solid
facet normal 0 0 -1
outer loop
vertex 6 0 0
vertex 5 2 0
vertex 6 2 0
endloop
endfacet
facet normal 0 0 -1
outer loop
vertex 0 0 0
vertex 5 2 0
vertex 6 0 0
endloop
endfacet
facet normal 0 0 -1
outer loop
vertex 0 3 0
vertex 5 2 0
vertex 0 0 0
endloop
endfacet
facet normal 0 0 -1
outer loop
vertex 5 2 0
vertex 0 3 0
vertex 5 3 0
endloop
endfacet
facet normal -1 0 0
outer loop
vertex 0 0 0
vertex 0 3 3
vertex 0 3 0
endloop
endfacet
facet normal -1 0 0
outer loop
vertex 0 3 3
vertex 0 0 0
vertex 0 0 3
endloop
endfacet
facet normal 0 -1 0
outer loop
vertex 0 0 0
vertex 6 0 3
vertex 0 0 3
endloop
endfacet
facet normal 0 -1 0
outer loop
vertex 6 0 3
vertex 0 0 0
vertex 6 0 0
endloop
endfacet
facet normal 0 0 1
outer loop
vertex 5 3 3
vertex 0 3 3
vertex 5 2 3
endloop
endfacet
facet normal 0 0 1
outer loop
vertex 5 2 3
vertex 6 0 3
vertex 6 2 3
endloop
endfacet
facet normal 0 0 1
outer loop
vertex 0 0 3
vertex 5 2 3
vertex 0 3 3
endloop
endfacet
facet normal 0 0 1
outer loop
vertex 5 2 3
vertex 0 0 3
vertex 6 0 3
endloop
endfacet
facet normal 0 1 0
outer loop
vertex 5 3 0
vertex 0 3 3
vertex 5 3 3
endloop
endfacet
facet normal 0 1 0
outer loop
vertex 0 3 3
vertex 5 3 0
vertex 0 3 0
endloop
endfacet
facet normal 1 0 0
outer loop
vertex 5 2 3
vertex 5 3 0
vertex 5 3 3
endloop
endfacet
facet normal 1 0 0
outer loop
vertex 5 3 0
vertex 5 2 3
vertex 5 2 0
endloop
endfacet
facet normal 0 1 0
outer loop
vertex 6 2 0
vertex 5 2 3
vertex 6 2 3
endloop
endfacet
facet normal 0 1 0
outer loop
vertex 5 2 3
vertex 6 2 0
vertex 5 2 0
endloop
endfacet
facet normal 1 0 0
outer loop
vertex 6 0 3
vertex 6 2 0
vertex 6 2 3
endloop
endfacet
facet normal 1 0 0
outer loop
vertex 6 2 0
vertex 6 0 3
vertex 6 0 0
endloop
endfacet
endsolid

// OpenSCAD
union() {
    translate([0.0, 0.0, 0.0]) cube([1, 1, 1]);
    translate([0.0, 0.0, 1.0]) cube([1, 1, 1]);
    translate([0.0, 0.0, 2.0]) cube([1, 1, 1]);
    translate([0.0, 1.0, 0.0]) cube([1, 1, 1]);
    translate([0.0, 1.0, 1.0]) cube([1, 1, 1]);
    translate([0.0, 1.0, 2.0]) cube([1, 1, 1]);
    translate([0.0, 2.0, 0.0]) cube([1, 1, 1]);
    translate([0.0, 2.0, 1.0]) cube([1, 1, 1]);
    translate([0.0, 2.0, 2.0]) cube([1, 1, 1]);
    translate([1.0, 0.0, 0.0]) cube([1, 1, 1]);
    translate([1.0, 0.0, 1.0]) cube([1, 1, 1]);
    translate([1.0, 0.0, 2.0]) cube([1, 1, 1]);
    translate([1.0, 1.0, 0.0]) cube([1, 1, 1]);
    translate([1.0, 1.0, 1.0]) cube([1, 1, 1]);
    translate([1.0, 1.0, 2.0]) cube([1, 1, 1]);
    translate([1.0, 2.0, 0.0]) cube([1, 1, 1]);
    translate([1.0, 2.0, 1.0]) cube([1, 1, 1]);
    translate([1.0, 2.0, 2.0]) cube([1, 1, 1]);
    translate([2.0, 0.0, 0.0]) cube([1, 1, 1]);
    translate([2.0, 0.0, 1.0]) cube([1, 1, 1]);
    translate([2.0, 0.0, 2.0]) cube([1, 1, 1]);
    translate([2.0, 1.0, 0.0]) cube([1, 1, 1]);
    translate([2.0, 1.0, 1.0]) cube([1, 1, 1]);
    translate([2.0, 1.0, 2.0]) cube([1, 1, 1]);
    translate([2.0, 2.0, 0.0]) cube([1, 1, 1]);
    translate([2.0, 2.0, 1.0]) cube([1, 1, 1]);
    translate([2.0, 2.0, 2.0]) cube([1, 1, 1]);
    translate([3.0, 0.0, 0.0]) cube([1, 1, 1]);
    translate([3.0, 0.0, 1.0]) cube([1, 1, 1]);
    translate([3.0, 0.0, 2.0]) cube([1, 1, 1]);
    translate([3.0, 1.0, 0.0]) cube([1, 1, 1]);
    translate([3.0, 1.0, 1.0]) cube([1, 1, 1]);
    translate([3.0, 1.0, 2.0]) cube([1, 1, 1]);
    translate([3.0, 2.0, 0.0]) cube([1, 1, 1]);
    translate([3.0, 2.0, 1.0]) cube([1, 1, 1]);
    translate([3.0, 2.0, 2.0]) cube([1, 1, 1]);
    translate([4.0, 0.0, 0.0]) cube([1, 1, 1]);
    translate([4.0, 0.0, 1.0]) cube([1, 1, 1]);
    translate([4.0, 0.0, 2.0]) cube([1, 1, 1]);
    translate([4.0, 1.0, 0.0]) cube([1, 1, 1]);
    translate([4.0, 1.0, 1.0]) cube([1, 1, 1]);
    translate([4.0, 1.0, 2.0]) cube([1, 1, 1]);
    translate([4.0, 2.0, 0.0]) cube([1, 1, 1]);
    translate([4.0, 2.0, 1.0]) cube([1, 1, 1]);
    translate([4.0, 2.0, 2.0]) cube([1, 1, 1]);
    translate([5.0, 0.0, 0.0]) cube([1, 1, 1]);
    translate([5.0, 0.0, 1.0]) cube([1, 1, 1]);
    translate([5.0, 0.0, 2.0]) cube([1, 1, 1]);
    translate([5.0, 1.0, 0.0]) cube([1, 1, 1]);
    translate([5.0, 1.0, 1.0]) cube([1, 1, 1]);
    translate([5.0, 1.0, 2.0]) cube([1, 1, 1]);
}
